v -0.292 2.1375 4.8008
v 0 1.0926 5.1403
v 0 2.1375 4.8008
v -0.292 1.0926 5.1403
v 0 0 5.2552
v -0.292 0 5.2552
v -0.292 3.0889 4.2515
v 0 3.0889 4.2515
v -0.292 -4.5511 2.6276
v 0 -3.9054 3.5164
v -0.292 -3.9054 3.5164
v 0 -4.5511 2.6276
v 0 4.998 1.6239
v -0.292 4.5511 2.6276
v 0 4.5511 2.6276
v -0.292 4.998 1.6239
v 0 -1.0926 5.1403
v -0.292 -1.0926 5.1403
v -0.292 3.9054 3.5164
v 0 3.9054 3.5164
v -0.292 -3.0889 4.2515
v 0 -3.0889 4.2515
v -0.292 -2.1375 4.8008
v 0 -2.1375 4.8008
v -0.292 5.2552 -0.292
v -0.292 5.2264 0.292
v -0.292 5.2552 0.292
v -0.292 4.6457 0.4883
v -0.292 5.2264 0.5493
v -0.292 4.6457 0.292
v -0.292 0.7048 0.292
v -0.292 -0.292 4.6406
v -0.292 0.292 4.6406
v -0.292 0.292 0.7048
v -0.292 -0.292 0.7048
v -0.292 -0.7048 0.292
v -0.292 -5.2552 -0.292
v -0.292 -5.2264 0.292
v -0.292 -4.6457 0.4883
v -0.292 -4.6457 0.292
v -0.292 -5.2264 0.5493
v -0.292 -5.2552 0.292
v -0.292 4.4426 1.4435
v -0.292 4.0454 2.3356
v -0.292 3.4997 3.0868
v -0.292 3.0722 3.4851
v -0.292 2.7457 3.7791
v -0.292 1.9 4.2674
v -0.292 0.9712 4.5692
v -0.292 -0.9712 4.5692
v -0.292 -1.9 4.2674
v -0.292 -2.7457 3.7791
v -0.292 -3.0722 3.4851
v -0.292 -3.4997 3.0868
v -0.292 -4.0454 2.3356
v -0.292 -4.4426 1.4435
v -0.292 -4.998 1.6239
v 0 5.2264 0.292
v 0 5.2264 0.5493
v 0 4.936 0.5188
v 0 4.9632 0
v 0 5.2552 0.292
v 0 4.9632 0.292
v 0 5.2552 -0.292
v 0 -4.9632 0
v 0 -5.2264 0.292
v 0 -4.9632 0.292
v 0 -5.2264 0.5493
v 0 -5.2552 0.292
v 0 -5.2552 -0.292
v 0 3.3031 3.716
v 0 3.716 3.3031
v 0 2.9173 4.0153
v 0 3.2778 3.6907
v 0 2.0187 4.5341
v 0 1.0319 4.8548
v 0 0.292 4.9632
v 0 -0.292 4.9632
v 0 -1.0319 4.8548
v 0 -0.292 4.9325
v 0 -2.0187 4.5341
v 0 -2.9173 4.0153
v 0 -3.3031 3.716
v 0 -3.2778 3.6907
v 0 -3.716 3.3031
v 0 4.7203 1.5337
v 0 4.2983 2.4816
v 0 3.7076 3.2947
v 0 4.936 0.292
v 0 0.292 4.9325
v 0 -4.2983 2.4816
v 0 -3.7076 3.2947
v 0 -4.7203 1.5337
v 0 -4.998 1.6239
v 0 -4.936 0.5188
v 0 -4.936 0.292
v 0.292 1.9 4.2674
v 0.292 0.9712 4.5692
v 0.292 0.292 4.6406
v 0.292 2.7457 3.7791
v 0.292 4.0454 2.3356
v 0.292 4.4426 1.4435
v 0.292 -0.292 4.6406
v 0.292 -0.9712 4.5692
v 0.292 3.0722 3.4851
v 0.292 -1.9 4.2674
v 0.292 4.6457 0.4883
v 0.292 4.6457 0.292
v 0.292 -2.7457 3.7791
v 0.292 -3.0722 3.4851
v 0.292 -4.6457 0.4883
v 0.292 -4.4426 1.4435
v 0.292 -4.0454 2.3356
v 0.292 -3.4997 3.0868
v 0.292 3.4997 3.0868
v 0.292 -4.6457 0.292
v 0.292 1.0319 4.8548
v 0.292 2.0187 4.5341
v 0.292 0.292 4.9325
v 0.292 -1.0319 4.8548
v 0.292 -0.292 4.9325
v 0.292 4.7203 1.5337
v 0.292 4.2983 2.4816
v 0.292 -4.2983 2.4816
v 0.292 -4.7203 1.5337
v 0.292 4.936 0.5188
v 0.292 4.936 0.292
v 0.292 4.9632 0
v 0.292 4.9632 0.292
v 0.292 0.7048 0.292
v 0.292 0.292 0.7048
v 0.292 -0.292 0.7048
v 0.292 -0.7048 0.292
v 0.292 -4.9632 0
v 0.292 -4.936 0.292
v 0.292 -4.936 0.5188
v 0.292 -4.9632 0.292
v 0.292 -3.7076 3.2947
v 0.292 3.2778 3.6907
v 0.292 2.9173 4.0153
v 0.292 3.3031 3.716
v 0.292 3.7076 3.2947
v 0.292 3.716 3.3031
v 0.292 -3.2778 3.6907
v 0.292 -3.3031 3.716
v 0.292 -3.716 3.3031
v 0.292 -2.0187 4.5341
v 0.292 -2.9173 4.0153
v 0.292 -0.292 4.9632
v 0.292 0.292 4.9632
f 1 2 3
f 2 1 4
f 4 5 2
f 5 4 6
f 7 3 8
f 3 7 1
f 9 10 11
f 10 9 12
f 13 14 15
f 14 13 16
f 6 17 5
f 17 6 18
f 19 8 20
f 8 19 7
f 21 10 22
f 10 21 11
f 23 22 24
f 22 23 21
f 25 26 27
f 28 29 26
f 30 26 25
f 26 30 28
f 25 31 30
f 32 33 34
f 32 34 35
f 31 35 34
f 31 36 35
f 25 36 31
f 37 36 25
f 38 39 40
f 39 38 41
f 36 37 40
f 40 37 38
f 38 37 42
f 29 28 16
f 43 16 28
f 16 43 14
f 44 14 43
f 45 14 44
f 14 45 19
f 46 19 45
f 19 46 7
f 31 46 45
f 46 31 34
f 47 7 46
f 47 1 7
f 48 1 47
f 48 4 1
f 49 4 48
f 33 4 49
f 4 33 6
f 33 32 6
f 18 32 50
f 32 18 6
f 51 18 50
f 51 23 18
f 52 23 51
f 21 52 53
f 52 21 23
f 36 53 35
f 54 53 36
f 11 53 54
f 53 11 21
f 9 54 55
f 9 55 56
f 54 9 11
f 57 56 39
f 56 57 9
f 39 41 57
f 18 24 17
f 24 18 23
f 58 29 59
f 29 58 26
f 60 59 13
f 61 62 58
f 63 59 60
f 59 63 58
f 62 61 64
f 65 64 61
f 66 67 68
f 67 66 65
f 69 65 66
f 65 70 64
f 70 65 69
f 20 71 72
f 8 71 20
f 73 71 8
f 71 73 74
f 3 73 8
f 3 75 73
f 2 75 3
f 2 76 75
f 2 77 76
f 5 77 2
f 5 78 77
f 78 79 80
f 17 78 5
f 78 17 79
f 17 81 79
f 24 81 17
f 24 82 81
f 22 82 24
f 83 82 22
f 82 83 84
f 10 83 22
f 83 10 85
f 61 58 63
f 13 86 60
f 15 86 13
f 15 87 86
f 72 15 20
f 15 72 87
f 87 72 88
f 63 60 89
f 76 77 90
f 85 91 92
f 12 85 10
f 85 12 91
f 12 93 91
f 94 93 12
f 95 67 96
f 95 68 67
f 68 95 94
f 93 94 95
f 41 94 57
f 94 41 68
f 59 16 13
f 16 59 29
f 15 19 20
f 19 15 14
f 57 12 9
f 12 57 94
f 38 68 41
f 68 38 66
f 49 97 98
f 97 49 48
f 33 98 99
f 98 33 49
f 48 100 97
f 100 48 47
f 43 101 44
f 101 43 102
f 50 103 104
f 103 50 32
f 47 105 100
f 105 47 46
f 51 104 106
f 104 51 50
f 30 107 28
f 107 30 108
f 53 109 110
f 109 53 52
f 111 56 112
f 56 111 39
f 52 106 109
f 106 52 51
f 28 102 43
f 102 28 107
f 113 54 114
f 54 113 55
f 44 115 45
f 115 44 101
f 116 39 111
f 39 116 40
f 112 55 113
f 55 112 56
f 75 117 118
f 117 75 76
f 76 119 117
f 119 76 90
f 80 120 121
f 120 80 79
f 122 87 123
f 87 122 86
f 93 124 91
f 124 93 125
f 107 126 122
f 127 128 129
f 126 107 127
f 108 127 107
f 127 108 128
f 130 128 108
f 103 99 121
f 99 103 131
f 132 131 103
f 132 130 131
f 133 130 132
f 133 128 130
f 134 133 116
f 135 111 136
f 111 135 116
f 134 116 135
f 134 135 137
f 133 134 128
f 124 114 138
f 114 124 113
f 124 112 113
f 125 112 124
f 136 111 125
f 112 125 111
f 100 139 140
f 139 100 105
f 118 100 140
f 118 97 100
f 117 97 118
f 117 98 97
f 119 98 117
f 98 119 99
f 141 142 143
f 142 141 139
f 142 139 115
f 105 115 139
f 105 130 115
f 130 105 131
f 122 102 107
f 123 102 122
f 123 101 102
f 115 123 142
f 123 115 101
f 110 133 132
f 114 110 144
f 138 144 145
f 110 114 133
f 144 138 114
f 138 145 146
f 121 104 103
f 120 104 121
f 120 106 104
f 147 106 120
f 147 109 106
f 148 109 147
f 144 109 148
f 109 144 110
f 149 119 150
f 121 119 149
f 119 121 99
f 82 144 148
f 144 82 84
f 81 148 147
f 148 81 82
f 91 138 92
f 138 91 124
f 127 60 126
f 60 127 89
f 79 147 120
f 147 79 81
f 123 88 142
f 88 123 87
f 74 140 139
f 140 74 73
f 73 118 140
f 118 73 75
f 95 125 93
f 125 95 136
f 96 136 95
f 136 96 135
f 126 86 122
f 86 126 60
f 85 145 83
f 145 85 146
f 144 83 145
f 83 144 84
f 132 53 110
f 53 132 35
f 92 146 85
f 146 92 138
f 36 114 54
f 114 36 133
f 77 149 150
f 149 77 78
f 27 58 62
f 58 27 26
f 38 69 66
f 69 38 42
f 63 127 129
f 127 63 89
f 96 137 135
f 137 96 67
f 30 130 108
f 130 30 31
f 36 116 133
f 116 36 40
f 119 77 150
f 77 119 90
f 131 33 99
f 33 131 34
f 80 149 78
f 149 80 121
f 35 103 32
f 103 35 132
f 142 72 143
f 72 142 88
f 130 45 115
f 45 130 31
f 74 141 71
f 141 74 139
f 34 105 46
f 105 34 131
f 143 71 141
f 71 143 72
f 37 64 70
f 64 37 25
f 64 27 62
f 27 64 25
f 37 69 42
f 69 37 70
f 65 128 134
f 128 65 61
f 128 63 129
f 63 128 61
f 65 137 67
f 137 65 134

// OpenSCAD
//Window diameter
diameter=36;
//Width of the frame components
framewidth=4;
//Number of muntins
numbermuntins=3;
//Width of the muntins
muntinwidth=2;

//The modeling scale of the .stl file.  Specifies the denominator of the scale, e.g., 1/87 for HO scale, the default.  Assumes the dimensions specified in the previous parameters are prototype, e.g. 1:1.
modeling_scale=87;
//Scales the model for printing.  Default is 25.4, the multiplier to convert decimal inches to millimeters.
printing_scale=25.4;


module halfround_window(diameter=36, framewidth=4, numbermuntins=3, muntinwidth=2) {
	rotate([0,-90,0]) {

		difference() {
			cylinder(d=diameter);
			translate([0,0,-5]) cylinder(d=diameter-framewidth, h=10);
			translate([-(diameter+muntinwidth)/2,0,0]) cube([(diameter+muntinwidth/2),(diameter+muntinwidth/2),diameter], center=true);
		}
		translate([0,0,-1])
		difference() {
			cylinder(d=diameter-framewidth/2);
			translate([0,0,-diameter/2]) cylinder(d=diameter-framewidth, h=diameter);
			translate([-diameter/2,0,0]) cube([diameter+1,diameter+1,diameter], center=true);
		}
		translate([-framewidth/2+1,-diameter/2,0])
			cube([framewidth/2,diameter,1]);
		translate([-framewidth/2+2,-(diameter-2)/2,-muntinwidth/2])
			cube([framewidth/4,diameter-2,muntinwidth/2]);

		for (i = [1:1:numbermuntins]) {
			rotate([0,0,270+(180/(numbermuntins+1))*i]) 
				translate([muntinwidth/2,-muntinwidth/2,-muntinwidth/2])
					cube([diameter/2-framewidth/2, muntinwidth, muntinwidth]);
		}
	}
}

scale(printing_scale)
	scale(1/modeling_scale)
		halfround_window(diameter, framewidth, numbermuntins, muntinwidth);
